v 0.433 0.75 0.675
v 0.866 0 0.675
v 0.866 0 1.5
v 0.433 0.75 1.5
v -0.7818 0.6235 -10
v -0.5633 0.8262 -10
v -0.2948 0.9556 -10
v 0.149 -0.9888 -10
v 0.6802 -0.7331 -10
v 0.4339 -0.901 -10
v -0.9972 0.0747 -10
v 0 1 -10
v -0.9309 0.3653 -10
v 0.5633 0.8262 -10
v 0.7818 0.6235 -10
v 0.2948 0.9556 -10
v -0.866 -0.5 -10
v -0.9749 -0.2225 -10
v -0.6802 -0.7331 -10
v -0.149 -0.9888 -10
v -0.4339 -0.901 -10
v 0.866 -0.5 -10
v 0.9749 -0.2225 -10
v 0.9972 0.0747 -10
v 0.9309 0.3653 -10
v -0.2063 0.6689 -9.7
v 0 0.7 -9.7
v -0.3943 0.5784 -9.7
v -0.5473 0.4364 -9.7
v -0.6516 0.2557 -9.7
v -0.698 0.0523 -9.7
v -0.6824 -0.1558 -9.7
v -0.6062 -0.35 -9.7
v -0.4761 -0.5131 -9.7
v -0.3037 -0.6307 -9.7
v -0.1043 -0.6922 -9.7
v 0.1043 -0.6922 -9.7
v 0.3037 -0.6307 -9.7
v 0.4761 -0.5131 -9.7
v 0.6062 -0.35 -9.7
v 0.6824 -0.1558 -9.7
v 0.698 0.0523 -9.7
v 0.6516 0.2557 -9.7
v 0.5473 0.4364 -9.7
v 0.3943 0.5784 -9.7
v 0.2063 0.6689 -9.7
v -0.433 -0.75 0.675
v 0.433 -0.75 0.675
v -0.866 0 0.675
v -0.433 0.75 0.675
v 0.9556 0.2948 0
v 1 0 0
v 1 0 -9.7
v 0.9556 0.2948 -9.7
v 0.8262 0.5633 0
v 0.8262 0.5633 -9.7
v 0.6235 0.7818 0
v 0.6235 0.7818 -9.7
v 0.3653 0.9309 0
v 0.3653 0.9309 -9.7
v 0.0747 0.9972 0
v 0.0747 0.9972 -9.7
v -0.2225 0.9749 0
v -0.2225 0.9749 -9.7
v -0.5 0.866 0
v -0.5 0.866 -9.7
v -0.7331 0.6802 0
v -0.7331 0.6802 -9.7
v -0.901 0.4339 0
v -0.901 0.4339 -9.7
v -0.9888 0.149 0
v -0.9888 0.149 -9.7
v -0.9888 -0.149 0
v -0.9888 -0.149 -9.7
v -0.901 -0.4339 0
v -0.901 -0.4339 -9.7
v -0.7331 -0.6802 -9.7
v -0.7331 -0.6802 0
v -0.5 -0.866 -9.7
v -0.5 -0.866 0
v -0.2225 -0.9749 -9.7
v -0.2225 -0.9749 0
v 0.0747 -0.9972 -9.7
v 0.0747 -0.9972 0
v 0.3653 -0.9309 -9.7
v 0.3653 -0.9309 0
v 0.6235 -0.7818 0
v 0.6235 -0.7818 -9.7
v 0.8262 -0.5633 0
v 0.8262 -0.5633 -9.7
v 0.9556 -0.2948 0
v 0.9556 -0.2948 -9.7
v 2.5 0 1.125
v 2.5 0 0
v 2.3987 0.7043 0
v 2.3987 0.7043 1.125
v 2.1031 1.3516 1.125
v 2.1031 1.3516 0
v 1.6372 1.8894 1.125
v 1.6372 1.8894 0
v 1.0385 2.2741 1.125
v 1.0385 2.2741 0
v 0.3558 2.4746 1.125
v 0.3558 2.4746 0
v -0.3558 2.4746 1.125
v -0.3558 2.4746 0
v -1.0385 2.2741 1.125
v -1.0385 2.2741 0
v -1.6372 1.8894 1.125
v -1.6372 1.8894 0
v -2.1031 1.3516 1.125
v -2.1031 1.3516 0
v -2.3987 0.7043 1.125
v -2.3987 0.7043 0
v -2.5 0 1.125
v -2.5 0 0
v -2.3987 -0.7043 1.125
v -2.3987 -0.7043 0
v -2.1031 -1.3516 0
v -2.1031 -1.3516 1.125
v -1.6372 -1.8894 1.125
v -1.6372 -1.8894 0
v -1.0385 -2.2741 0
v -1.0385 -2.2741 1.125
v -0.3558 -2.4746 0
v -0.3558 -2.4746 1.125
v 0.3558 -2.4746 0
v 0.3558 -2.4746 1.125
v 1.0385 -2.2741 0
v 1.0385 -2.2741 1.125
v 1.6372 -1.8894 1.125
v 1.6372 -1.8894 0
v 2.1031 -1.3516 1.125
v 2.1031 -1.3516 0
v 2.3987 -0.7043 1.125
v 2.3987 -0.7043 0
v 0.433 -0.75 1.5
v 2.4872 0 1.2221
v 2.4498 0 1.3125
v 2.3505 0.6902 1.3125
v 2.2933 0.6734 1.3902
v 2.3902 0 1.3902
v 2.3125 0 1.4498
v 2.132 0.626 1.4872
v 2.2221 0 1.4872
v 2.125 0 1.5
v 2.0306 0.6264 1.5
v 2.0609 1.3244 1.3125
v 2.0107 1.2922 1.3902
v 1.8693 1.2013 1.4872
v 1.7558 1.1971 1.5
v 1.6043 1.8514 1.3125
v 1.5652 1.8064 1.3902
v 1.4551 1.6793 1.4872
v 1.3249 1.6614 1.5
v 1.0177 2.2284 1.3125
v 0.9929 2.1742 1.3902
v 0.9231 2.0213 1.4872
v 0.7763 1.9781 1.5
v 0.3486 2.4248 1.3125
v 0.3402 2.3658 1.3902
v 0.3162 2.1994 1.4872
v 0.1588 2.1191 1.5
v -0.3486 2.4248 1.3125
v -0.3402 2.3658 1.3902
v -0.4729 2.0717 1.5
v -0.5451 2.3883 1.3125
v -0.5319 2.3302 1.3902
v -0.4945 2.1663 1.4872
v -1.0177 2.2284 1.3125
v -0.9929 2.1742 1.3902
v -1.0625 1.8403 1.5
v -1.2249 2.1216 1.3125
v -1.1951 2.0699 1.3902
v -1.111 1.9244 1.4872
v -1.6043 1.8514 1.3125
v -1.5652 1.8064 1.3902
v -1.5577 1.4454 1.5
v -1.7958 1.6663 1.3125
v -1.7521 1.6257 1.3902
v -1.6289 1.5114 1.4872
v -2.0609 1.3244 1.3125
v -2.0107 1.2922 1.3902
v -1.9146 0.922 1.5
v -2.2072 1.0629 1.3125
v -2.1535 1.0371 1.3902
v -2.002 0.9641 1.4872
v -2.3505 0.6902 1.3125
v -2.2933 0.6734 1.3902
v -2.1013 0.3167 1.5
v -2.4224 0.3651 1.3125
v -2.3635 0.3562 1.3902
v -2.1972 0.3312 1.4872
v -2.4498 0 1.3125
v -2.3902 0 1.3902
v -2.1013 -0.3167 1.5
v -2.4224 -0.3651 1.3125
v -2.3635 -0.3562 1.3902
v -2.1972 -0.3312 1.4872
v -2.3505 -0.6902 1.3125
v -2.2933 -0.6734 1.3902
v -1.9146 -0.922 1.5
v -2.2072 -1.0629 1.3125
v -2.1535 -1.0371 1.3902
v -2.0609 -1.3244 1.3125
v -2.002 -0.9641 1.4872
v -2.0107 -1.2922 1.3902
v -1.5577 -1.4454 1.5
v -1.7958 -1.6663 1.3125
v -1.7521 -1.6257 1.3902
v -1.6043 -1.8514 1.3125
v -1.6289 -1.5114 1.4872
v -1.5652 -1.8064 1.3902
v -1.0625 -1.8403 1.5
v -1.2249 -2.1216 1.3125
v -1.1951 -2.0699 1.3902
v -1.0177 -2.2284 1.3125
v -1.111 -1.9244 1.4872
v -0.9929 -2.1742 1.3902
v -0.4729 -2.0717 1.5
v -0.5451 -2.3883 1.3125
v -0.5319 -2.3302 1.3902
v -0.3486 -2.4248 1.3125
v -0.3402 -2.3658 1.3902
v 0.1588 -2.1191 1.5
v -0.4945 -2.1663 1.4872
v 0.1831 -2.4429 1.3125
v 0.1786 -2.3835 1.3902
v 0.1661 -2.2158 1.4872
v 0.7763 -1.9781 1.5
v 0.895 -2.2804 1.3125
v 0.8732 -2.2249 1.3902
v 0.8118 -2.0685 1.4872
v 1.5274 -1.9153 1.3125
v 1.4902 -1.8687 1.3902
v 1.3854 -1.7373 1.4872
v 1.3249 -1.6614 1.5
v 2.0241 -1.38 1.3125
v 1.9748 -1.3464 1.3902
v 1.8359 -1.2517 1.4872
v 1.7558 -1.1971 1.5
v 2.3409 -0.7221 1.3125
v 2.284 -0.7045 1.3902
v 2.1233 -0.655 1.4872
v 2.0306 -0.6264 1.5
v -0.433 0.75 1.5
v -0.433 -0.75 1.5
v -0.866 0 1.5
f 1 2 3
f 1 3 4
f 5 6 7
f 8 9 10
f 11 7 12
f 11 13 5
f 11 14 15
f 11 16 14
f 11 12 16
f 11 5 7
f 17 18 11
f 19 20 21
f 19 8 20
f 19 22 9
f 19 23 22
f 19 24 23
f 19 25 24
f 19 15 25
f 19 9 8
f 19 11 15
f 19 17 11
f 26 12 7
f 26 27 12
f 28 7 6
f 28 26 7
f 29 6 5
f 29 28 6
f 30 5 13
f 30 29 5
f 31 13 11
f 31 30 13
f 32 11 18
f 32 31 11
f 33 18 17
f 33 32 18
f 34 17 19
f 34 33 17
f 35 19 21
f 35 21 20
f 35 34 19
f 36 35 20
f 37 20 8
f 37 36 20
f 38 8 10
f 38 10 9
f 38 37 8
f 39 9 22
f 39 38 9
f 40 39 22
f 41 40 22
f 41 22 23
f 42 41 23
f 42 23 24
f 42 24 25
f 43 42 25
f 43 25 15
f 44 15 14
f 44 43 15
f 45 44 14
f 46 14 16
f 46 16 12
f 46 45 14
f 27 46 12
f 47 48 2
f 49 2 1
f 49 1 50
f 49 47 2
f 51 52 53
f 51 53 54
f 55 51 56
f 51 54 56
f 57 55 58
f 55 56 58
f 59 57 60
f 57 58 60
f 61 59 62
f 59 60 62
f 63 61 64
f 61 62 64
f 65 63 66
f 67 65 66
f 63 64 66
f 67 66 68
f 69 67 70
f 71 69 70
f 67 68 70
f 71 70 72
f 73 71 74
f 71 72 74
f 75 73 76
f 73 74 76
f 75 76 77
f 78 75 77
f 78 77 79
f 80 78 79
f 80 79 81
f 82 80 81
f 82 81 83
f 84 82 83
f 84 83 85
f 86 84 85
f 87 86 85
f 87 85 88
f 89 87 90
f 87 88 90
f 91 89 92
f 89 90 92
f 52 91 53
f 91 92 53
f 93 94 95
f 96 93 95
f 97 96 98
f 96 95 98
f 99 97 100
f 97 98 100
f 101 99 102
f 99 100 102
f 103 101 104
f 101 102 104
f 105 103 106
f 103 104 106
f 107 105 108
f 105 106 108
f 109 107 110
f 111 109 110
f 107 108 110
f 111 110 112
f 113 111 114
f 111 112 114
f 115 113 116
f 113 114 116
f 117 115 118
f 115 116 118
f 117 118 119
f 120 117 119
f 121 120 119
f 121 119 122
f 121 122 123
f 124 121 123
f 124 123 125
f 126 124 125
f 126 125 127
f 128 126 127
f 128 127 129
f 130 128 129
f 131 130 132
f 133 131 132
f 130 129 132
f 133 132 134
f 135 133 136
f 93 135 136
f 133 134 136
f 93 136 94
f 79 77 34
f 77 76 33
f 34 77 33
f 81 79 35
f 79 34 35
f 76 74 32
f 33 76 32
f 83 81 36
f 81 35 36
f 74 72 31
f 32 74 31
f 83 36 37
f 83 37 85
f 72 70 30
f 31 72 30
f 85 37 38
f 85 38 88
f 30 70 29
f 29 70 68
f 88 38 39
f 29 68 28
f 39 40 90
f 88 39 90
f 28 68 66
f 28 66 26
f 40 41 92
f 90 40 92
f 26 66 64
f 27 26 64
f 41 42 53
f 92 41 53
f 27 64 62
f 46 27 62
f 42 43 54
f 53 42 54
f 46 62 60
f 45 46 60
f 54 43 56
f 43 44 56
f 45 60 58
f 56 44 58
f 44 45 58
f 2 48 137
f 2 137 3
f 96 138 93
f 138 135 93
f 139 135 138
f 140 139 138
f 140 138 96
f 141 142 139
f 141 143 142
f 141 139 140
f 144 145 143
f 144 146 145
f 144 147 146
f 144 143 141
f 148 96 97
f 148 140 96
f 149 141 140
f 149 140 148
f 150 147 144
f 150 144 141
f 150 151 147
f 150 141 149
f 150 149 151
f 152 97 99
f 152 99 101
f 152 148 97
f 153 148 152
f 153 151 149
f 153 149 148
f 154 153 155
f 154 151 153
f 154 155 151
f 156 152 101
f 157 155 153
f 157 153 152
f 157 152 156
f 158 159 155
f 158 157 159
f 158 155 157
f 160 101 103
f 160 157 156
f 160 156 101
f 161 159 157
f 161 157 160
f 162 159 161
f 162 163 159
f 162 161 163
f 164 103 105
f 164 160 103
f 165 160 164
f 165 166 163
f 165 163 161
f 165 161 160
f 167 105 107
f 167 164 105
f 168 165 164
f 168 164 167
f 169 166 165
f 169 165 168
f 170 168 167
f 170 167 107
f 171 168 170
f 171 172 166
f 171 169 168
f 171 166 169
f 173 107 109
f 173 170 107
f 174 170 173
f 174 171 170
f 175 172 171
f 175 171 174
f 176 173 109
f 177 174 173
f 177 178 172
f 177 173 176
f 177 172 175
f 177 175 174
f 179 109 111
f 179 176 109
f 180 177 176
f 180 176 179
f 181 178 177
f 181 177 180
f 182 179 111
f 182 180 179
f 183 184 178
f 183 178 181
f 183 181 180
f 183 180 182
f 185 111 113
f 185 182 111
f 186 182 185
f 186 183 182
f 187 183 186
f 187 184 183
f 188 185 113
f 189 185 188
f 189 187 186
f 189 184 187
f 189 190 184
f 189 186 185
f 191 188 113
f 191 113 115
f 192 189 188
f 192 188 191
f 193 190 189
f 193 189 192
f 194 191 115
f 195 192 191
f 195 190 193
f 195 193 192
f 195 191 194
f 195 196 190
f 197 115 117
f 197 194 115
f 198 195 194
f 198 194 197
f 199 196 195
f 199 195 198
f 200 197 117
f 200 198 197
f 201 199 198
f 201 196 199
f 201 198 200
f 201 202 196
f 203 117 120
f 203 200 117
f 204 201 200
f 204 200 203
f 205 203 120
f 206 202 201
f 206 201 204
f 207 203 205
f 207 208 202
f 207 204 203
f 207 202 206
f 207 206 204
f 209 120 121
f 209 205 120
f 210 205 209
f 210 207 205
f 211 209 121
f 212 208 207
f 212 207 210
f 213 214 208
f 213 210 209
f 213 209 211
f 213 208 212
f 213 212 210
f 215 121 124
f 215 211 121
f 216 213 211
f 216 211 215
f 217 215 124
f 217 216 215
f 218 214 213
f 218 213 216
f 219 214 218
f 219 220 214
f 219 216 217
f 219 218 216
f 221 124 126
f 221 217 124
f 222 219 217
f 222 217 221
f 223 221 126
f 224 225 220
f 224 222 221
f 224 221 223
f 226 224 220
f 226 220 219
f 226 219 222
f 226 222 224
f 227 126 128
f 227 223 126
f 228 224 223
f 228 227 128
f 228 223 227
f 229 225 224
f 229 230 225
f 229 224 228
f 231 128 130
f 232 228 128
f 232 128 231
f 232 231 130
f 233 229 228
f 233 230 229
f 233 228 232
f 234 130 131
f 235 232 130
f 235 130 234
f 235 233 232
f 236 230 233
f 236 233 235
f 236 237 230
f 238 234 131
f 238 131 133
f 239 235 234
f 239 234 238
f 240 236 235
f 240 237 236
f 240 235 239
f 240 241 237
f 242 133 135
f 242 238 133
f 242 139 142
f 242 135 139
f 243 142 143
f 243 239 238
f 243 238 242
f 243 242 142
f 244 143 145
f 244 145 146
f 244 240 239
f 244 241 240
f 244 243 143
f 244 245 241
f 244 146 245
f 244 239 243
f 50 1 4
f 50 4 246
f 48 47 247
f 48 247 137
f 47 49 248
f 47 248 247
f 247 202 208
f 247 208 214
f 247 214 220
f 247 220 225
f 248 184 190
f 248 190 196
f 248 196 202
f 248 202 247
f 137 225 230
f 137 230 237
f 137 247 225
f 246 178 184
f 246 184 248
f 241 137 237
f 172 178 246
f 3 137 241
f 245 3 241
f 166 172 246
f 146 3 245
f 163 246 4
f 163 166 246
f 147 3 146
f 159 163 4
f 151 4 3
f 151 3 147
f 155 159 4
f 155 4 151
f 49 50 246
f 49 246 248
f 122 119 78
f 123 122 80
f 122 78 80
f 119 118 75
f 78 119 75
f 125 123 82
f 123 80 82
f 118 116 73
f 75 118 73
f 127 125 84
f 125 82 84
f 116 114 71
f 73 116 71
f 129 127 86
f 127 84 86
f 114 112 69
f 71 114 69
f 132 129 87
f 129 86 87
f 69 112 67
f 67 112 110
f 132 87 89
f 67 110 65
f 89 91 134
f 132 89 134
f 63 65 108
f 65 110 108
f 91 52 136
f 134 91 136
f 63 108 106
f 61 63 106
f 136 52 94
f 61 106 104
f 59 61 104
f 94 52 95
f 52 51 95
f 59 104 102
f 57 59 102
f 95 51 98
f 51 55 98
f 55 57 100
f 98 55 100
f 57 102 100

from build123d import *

# Parameters (mm, degrees)
F_0000_CYLINDER_SKETCH_R    = 2.5
F_0000_CYLINDER_DEPTH       = 1.5
F_0001_FILLET_R             = 0.375
F_0002_EXTRUDE_DEPTH        = 0.835
F_0002_EXTRUDE_ROTATE_ANGLE = 120
F_0005_CYLINDER_SKETCH_R    = 1
F_0005_CYLINDER_DEPTH       = 9.7
F_0006_CONE_ROTATE_ANGLE    = 90


with BuildPart() as part:
    # 0000_cylinder_Sketch → 0000_cylinder (new body)
    with BuildSketch(Plane.XY):
        Circle(F_0000_CYLINDER_SKETCH_R)
    extrude(amount=F_0000_CYLINDER_DEPTH)

    # 0001_fillet
    f_0001_fillet_edges = [part.edges().sort_by_distance(p)[0] for p in [
        (-2.5, 0, 1.5),
    ]]
    fillet(f_0001_fillet_edges, radius=F_0001_FILLET_R)


with BuildPart() as body_2:
    # 0002_extrude_Sketch → 0002_extrude (new body)
    with BuildSketch(Plane.XY):
        Polygon((0, 0), (0.866025404, 0), (1.299038106, 0.75), (0.866025404, 1.5), (0, 1.5), (-0.433012702, 0.75), align=None)
    extrude(amount=F_0002_EXTRUDE_DEPTH)


with BuildPart() as body_2_1:
    # 0002_extrude_Rotate: read off the stored shape, not the designer's step
    # 0002_extrude_Rotate: moved
    add(body_2.part.rotate(Axis((0, 0, 0), (0, 0, 1)), F_0002_EXTRUDE_ROTATE_ANGLE))


with BuildPart() as body_2_2:
    # 0002_extrude_Translate: moved
    add(body_2_1.part.moved(Location((0.866025404, 0, 0.675))))


with BuildPart() as part_1:
    add(part.part)

    # 0004_sub: cut body 2
    add(body_2_2.part, mode=Mode.SUBTRACT)


with BuildPart() as body_2_2_1:
    # 0005_cylinder_Sketch → 0005_cylinder (new body)
    with BuildSketch(Plane.XY):
        Circle(F_0005_CYLINDER_SKETCH_R)
    extrude(amount=F_0005_CYLINDER_DEPTH)


with BuildPart() as body_2_2_2:
    # 0005_cylinder_Translate: moved
    add(body_2_2_1.part.moved(Location((0, 0, -9.7))))


with BuildPart() as body_3:
    # 0006_cone_Sketch → 0006_cone (revolve)
    with BuildSketch(Plane.XY, mode=Mode.PRIVATE) as f_0006_cone_sk:
        Polygon((0, 0), (1, 0), (0.7, 0.3), (0, 0.3), align=None)
    revolve(f_0006_cone_sk.sketch.rotate(Axis((0, -100, 0), (0, 1, 0)), 90), axis=Axis((0, -100, 0), (0, 1, 0)))


with BuildPart() as body_3_1:
    # 0006_cone_Rotate: moved
    add(body_3.part.rotate(Axis((0, 0, 0), (1, 0, 0)), F_0006_CONE_ROTATE_ANGLE))


with BuildPart() as body_3_2:
    # 0006_cone_Translate: moved
    add(body_3_1.part.moved(Location((0, 0, -10))))


with BuildPart() as body_2_2_3:
    add(body_2_2_2.part)

    # 0008_add: union body 3
    add(body_3_2.part)


with BuildPart() as part_2:
    add(part_1.part)

    # 0009_add: union body 2 2
    add(body_2_2_3.part)


solid = part_2.part
